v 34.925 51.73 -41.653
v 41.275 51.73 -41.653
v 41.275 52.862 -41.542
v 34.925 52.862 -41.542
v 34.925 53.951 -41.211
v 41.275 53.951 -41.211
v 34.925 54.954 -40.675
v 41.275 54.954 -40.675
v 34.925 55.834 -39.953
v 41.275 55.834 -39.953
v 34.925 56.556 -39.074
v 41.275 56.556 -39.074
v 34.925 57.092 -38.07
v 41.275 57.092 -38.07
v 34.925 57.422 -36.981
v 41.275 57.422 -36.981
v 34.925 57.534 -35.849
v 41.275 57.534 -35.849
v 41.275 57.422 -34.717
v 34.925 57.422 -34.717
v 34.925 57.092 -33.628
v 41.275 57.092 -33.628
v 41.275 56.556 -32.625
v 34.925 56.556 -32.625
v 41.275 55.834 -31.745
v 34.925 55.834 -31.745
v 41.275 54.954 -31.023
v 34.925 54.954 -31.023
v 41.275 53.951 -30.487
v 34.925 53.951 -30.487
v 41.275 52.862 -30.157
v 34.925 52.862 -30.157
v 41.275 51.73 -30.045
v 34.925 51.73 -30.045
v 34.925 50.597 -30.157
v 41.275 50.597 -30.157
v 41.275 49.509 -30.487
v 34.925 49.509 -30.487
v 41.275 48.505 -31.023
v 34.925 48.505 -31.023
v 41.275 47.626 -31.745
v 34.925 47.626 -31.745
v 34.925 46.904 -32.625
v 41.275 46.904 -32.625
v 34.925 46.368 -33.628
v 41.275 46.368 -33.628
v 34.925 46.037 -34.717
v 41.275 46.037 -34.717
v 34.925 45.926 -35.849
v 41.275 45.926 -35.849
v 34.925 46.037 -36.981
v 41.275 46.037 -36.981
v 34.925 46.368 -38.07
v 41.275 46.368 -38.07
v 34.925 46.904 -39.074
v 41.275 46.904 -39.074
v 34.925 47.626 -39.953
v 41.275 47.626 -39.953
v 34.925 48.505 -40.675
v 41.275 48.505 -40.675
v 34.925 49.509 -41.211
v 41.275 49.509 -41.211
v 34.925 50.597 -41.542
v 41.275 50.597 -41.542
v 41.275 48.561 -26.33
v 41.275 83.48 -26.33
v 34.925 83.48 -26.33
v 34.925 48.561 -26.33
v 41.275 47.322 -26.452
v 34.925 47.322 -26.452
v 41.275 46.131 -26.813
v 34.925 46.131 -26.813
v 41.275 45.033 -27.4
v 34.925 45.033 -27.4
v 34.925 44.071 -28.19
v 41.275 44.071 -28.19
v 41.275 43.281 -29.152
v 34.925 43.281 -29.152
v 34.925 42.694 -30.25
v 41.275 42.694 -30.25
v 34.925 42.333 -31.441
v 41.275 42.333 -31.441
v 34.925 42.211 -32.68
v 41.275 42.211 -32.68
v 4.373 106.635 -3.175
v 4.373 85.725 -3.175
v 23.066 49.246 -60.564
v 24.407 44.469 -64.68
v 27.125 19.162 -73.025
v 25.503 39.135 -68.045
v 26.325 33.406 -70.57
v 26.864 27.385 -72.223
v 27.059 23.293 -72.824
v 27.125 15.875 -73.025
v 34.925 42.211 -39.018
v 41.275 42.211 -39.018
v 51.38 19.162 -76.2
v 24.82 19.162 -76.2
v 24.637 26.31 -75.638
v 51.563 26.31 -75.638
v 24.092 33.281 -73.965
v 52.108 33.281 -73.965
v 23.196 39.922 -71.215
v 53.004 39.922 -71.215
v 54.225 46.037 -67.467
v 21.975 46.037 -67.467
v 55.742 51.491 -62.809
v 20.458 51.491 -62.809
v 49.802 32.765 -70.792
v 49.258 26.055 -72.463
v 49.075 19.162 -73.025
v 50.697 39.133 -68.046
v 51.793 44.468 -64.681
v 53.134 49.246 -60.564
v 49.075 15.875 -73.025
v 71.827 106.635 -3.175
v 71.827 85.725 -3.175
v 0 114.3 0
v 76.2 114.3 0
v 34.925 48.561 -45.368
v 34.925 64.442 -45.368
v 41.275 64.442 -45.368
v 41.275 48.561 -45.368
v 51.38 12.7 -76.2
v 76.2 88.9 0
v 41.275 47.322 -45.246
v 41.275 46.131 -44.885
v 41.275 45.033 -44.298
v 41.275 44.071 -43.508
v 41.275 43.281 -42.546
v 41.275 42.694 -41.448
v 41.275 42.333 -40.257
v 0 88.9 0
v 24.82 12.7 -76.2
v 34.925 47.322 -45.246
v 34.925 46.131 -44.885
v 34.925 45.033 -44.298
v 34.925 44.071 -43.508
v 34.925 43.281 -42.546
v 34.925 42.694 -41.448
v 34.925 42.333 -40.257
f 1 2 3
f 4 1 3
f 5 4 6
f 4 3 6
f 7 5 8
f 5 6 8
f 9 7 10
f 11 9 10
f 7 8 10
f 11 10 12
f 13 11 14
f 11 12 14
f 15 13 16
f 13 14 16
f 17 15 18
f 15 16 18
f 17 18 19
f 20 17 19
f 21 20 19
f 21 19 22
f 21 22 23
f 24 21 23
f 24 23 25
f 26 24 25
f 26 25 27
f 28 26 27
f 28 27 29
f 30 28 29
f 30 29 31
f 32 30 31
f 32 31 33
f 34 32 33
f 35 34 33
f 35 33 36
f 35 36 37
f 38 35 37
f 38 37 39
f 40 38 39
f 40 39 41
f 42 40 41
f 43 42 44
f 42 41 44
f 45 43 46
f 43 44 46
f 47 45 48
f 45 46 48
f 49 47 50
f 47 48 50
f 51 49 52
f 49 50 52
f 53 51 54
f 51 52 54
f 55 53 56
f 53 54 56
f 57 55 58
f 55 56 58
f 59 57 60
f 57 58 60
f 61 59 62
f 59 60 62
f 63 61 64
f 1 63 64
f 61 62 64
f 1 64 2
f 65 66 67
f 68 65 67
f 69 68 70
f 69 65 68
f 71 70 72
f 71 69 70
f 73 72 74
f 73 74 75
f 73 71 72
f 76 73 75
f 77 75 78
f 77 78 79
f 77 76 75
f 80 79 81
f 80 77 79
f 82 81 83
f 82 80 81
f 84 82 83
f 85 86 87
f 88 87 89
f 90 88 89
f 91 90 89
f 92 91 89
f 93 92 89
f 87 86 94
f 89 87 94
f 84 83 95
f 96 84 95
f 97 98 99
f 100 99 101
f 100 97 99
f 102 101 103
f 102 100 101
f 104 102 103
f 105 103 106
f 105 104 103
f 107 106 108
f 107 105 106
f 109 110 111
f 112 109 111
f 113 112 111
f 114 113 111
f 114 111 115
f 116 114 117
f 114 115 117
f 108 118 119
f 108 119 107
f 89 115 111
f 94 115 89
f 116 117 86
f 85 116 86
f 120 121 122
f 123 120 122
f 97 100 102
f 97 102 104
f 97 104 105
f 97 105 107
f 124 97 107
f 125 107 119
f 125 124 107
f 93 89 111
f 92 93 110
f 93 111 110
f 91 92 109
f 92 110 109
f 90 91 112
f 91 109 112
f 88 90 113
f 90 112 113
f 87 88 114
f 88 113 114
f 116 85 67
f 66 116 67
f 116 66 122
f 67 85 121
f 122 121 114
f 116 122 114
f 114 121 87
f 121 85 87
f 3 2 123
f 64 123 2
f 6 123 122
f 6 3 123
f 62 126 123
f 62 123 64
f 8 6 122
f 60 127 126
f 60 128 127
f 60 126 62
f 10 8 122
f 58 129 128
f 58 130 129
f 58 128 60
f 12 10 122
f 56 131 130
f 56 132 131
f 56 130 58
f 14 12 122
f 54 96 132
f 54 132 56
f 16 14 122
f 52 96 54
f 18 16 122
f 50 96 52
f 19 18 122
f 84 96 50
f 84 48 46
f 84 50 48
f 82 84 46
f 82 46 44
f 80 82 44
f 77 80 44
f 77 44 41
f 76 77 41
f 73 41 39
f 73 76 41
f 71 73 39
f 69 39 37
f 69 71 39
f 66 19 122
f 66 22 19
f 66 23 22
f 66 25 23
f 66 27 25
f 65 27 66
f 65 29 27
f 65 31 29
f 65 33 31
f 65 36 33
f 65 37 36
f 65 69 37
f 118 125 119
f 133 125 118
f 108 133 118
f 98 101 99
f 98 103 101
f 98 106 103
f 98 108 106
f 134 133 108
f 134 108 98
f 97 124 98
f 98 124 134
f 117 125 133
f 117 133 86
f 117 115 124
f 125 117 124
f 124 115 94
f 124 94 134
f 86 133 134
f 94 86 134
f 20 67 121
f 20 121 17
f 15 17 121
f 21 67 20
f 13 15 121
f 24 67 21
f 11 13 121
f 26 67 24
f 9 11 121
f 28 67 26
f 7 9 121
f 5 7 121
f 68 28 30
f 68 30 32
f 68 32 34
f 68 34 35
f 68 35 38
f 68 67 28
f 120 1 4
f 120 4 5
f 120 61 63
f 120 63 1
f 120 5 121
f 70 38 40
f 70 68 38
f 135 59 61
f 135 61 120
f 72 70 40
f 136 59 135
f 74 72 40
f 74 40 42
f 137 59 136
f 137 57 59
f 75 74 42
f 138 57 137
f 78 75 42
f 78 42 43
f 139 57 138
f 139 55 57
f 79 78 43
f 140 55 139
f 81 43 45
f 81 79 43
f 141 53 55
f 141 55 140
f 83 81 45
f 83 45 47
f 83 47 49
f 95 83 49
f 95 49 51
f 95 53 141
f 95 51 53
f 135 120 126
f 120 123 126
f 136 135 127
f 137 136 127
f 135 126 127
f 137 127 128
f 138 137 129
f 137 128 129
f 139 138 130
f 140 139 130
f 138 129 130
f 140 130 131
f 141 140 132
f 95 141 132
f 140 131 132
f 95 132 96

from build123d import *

# Parameters (mm, degrees)
BOSS_EXTRUDE1_DEPTH            = 114.3
CUT_EXTRUDE2_DEPTH             = 161.602521773
CUT_EXTRUDE1_DEPTH             = 158.090324336
FILLET1_R                      = 45.72
SHELL1_T                       = -3.175
SKETCH6_W                      = 6.35
SKETCH6_H                      = 26.924
CUT_EXTRUDE3_REACH             = 145.438
F_1_16_0_457_DOWEL_HOLE1_D     = 11.6078
F_1_16_0_457_DOWEL_HOLE1_DEPTH = 6.35
FILLET2_R                      = 6.35


with BuildPart() as part:
    # Sketch1 → Boss-Extrude1 (new body)
    with BuildSketch(Plane(origin=(0, 0, 0), x_dir=(1, 0, 0), z_dir=(0, 1, 0))):
        Polygon((0, 0), (27.1, 83.2), (49.1, 83.2), (76.2, 0), align=None)
    extrude(amount=BOSS_EXTRUDE1_DEPTH)

    # Sketch5 → Cut-Extrude2 (cut, through all)
    with BuildSketch(Plane.XZ):
        Polygon((49.1, -83.2), (51.380048077, -76.2), (24.819951923, -76.2), (27.1, -83.2), align=None)
    extrude(amount=-CUT_EXTRUDE2_DEPTH, mode=Mode.SUBTRACT)

    # Sketch2 → Cut-Extrude1 (cut, through all)
    with BuildSketch(Plane(origin=(0, 0, 0), x_dir=(0, 0, -1), z_dir=(1, 0, 0))):
        Polygon((0, 114.3), (76.2, 38.1), (76.2, 114.3), align=None)
        Polygon((0, 88.9), (76.2, 12.7), (76.2, 0), (0, 0), align=None)
    extrude(amount=CUT_EXTRUDE1_DEPTH, mode=Mode.SUBTRACT)

    # Fillet1
    fillet1_edges = [part.edges().sort_by_distance(p)[0] for p in [
        (38.1, 38.1, -76.2),
    ]]
    fillet(fillet1_edges, radius=FILLET1_R)

    # Shell1
    shell1_openings = [part.faces().sort_by_distance(p)[0] for p in [
        (38.1, 56.934937611, -31.965062389),
    ]]
    offset(amount=SHELL1_T, openings=shell1_openings, kind=Kind.INTERSECTION)

    # Sweep1: sweep along a path in Sketch7
    with BuildLine(Plane.ZY.offset(-38.1)) as sweep1_path:
        Line((-35.849182435, 73.960689504), (-35.849182435, 23.160689504))
    # Sketch6 → Sweep1 (sweep)
    with BuildSketch(Plane(origin=(0, 54.90493597, -54.90493597), x_dir=(1, 0, 0), z_dir=(0, -0.7071067811865517, 0.7071067811865434))):
        with Locations((38.1, 26.94890509)):
            Rectangle(SKETCH6_W, SKETCH6_H)
    sweep(path=sweep1_path.line)

    # Sketch11 → Cut-Extrude3 (cut, up to next)
    with BuildSketch(Plane.ZY.offset(-34.925), mode=Mode.PRIVATE) as cut_extrude3_sk1:
        Polygon((-26.330110947, 42.210689504), (-45.368253924, 42.210689504), (-45.368253924, 13.641618016), (-26.330110947, 32.679760992), align=None)
    cut_extrude3_tool1 = extrude(cut_extrude3_sk1.sketch, amount=-CUT_EXTRUDE3_REACH, mode=Mode.PRIVATE) & part.part
    add(cut_extrude3_tool1.solids().sort_by_distance((34.925, 31.892927, -37.434707))[0], mode=Mode.SUBTRACT)

    # 1/16 (0.457) Dowel Hole1
    with Locations(Plane.ZY.offset(-34.925)):
        with Locations((-35.849182435, 51.729760992)):
            Hole(F_1_16_0_457_DOWEL_HOLE1_D / 2, depth=F_1_16_0_457_DOWEL_HOLE1_DEPTH)

    # Fillet2
    fillet2_edges = [part.edges().sort_by_distance(p)[0] for p in [
        (38.1, 42.210689504, -26.330110947),
        (38.1, 42.210689504, -45.368253924),
    ]]
    fillet(fillet2_edges, radius=FILLET2_R)


solid = part.part
